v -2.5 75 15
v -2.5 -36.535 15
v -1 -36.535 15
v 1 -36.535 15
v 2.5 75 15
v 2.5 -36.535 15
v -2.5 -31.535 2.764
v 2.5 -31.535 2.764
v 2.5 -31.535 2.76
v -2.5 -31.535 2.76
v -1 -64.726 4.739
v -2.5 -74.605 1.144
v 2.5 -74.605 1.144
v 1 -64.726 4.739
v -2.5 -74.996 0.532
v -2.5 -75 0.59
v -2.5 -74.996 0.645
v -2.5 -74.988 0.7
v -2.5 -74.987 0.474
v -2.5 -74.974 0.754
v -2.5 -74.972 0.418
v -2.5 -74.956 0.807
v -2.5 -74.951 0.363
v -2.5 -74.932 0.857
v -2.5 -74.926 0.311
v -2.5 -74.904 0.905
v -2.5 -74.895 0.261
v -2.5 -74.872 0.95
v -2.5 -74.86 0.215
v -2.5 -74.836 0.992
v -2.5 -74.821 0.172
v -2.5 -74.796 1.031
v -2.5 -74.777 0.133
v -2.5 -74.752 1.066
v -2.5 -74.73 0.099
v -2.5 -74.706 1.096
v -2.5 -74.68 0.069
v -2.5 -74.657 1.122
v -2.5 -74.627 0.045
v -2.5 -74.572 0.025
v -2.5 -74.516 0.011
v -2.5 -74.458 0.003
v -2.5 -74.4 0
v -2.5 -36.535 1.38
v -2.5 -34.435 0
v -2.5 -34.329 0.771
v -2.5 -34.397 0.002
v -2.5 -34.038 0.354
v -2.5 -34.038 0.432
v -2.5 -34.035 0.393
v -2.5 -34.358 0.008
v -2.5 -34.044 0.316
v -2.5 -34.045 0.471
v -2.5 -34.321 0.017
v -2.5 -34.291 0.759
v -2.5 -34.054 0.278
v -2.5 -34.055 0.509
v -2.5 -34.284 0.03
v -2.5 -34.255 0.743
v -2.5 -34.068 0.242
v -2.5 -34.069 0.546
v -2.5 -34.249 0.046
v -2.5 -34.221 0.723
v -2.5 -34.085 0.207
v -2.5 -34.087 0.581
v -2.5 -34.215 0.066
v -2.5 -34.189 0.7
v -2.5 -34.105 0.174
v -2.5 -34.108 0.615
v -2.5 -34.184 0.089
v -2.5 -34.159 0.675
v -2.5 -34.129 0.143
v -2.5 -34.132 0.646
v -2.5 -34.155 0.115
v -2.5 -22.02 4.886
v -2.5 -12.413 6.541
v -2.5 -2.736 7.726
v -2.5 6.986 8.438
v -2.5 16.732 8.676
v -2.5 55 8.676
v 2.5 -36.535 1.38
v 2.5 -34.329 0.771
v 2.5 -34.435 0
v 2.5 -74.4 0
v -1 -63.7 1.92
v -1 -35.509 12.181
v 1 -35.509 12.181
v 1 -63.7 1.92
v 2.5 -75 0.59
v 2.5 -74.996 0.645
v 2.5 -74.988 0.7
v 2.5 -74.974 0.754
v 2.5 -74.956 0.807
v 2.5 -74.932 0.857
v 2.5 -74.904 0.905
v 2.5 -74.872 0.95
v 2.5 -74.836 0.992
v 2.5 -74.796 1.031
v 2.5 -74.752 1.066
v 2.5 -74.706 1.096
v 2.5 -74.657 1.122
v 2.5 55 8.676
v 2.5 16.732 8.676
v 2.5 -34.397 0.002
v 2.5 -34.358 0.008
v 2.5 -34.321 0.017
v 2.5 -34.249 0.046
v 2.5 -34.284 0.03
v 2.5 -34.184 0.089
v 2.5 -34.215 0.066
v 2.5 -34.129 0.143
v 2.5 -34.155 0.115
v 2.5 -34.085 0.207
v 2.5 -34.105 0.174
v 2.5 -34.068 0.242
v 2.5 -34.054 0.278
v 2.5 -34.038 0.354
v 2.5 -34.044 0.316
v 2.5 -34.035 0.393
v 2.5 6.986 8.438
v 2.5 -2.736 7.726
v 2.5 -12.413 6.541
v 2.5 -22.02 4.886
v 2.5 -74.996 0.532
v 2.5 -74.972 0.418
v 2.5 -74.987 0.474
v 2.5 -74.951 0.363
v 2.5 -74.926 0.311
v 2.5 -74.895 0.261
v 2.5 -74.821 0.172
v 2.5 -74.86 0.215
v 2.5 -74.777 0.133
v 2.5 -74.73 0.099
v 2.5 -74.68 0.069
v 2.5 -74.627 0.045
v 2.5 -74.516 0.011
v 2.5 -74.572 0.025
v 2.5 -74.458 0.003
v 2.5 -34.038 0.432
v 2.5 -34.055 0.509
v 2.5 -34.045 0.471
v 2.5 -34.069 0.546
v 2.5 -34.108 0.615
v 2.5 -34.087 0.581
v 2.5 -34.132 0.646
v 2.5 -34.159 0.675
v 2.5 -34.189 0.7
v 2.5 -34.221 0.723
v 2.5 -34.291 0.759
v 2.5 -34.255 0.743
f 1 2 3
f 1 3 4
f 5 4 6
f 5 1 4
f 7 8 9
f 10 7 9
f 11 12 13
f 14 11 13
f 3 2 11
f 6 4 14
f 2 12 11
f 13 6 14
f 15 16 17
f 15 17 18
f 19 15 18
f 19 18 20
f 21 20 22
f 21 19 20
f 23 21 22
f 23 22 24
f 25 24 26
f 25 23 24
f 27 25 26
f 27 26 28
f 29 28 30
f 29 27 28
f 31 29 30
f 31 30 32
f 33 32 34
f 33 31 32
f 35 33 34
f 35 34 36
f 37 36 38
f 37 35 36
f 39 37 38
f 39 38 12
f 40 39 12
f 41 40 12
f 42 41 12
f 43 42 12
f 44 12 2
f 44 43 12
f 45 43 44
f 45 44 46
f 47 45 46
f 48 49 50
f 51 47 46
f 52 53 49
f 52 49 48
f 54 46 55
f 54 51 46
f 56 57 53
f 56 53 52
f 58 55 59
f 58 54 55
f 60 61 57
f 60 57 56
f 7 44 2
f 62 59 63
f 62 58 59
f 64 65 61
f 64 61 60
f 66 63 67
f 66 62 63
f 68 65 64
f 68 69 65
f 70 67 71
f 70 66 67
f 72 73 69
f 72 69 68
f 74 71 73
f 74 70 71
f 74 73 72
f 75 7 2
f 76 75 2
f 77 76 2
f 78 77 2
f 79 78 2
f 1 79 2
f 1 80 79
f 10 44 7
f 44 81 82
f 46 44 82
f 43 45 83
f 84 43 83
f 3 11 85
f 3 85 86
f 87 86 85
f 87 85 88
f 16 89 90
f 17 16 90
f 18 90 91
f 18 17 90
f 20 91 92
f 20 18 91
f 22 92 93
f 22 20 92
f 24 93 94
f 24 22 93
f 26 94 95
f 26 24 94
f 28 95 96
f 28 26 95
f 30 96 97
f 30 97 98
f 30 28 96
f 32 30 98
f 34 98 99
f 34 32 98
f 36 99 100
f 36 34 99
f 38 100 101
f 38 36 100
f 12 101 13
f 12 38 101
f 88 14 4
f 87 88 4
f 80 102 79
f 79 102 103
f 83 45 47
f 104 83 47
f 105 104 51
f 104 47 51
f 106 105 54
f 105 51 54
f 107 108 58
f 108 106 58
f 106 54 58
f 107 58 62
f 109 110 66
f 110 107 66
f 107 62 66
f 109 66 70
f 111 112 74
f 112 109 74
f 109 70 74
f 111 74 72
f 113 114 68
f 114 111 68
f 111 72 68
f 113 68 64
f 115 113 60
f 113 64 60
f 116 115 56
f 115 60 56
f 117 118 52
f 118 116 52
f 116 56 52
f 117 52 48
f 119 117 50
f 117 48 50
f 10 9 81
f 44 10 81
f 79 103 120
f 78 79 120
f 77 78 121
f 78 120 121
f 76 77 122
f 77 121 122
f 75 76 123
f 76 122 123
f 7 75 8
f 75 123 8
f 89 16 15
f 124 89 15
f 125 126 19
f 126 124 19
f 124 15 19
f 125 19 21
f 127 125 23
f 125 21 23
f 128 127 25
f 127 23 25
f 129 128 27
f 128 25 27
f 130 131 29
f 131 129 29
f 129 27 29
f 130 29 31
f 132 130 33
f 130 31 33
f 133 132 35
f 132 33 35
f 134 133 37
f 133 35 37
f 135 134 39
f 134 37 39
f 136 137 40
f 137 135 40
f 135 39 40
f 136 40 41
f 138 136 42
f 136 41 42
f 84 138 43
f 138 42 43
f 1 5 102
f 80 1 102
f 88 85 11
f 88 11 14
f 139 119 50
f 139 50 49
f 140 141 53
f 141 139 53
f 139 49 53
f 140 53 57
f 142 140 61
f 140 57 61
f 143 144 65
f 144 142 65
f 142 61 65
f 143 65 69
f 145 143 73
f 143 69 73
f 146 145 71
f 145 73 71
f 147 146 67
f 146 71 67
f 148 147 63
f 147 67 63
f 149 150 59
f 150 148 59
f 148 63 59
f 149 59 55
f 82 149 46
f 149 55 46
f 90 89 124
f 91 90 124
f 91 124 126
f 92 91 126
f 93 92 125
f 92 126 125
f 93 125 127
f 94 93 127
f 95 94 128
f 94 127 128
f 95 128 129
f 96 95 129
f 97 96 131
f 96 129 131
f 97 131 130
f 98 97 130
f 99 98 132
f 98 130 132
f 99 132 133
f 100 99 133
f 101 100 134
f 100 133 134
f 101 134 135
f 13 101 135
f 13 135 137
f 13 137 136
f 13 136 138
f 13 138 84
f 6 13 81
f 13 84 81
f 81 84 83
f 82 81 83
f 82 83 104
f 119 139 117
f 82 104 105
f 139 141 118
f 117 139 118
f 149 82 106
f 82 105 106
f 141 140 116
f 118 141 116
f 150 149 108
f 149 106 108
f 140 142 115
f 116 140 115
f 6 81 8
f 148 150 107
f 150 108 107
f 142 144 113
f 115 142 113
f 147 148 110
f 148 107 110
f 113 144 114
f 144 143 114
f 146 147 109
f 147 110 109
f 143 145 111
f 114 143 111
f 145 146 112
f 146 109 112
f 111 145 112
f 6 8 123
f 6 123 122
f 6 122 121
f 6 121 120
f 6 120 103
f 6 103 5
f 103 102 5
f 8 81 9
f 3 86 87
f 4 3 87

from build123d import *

# Parameters (mm, degrees)
F0_W        = 5
F0_H        = 150
F1_DEPTH    = 15
F2_SIZE2    = 38.4646838724
F2_SIZE     = 14
F3_T1_DEPTH = 7.1006226146
F3_T3_DEPTH = 8
F5_DEPTH    = 25
F6_T1_DEPTH = 6.5227780604
F6_T3_DEPTH = 7
F7_W        = 2
F7_H        = 30
F8_DEPTH    = 3


# Not quite as in the source:
# - a fillet or chamfer that OpenCascade refuses, or shapes differently, is made with other operations: its cross-section is extruded or revolved along the edge and cut away or added


with BuildPart() as f1:
    # F0 (on Top) → F1 (new body)
    with BuildSketch(Plane.XY):
        Rectangle(F0_W, F0_H)
    extrude(amount=F1_DEPTH)

    # F2
    f2_edges = [f1.edges().sort_by_distance(p)[0] for p in [
        (0, -75, 15),
    ]]
    f2_side = f1.faces().sort_by_distance((0, -75, 7.5))[0]
    chamfer(f2_edges, length=F2_SIZE, length2=F2_SIZE2, reference=f2_side)

    # F3: fillet of radius 0.6 on 2 edges, made by hand

    # F3_s2 → F3_t1 (cut)
    with BuildSketch(Plane.YZ.offset(-3.5503113073)):
        with BuildLine():
            ThreePointArc((-75, 0.5798754771), (-74.8914912266, 0.9240213389), (-74.605212086, 1.1436910495))
            Line((-74.605212086, 1.1436910495), (-75, 1))
            Line((-75, 1), (-75, 0.5798754771))
        make_face()
    extrude(amount=F3_T1_DEPTH, mode=Mode.SUBTRACT)

    # F3_s4 → F3_t3 (cut)
    with BuildSketch(Plane.YZ.offset(-4)):
        with BuildLine():
            ThreePointArc((-75, 0.6), (-74.8242640687, 0.1757359313), (-74.4, 0))
            Line((-74.4, 0), (-75, 0))
            Line((-75, 0), (-75, 0.6))
        make_face()
    extrude(amount=F3_T3_DEPTH, mode=Mode.SUBTRACT)

    # F4 (on face) → F5 (cut)
    with BuildSketch(Plane.YZ.offset(2.5)):
        Polygon((55, 8.6759815816), (75, 8.6759815816), (75, 15), align=None)
        with BuildLine():
            ThreePointArc((16.7323419362, 8.6759815816), (46.1873611716, 6.4950955262), (75, 0))
            Line((75, 0), (75, 8.6759815816))
            Line((75, 8.6759815816), (55, 8.6759815816))
            Line((55, 8.6759815816), (16.7323419362, 8.6759815816))
        make_face()
        with BuildLine():
            Line((-31.5353161276, 0), (75, 0))
            ThreePointArc((75, 0), (46.1873611716, 6.4950955262), (16.7323419362, 8.6759815816))
            ThreePointArc((16.7323419362, 8.6759815816), (-7.5818312879, 7.1925324796), (-31.5353161276, 2.7641913859))
            Line((-31.5353161276, 2.7641913859), (-31.5353161276, 2.76))
            Line((-31.5353161276, 2.76), (-31.5353161276, 0))
        make_face()
        Polygon((-34.0353161276, 0.69), (-31.5353161276, 0), (-31.5353161276, 2.76), (-36.5353161276, 1.38), align=None)
        Polygon((-34.0353161276, 0), (-31.5353161276, 0), (-34.0353161276, 0.69), align=None)
    extrude(amount=-F5_DEPTH, mode=Mode.SUBTRACT)

    # F6: fillet of radius 0.4 on 2 edges, made by hand

    # F6_s2 → F6_t1 (cut)
    with BuildSketch(Plane.YZ.offset(-3.2613890302)):
        with BuildLine():
            ThreePointArc((-34.0353161276, 0.3854443879), (-34.1170643339, 0.6277578125), (-34.3288951064, 0.7710277981))
            Line((-34.3288951064, 0.7710277981), (-34.0353161276, 0.69))
            Line((-34.0353161276, 0.69), (-34.0353161276, 0.3854443879))
        make_face()
    extrude(amount=F6_T1_DEPTH, mode=Mode.SUBTRACT)

    # F6_s4 → F6_t3 (cut)
    with BuildSketch(Plane.YZ.offset(-3.5)):
        with BuildLine():
            ThreePointArc((-34.4353161276, 0), (-34.1524734152, 0.1171572875), (-34.0353161276, 0.4))
            Line((-34.0353161276, 0.4), (-34.0353161276, 0))
            Line((-34.0353161276, 0), (-34.4353161276, 0))
        make_face()
    extrude(amount=F6_T3_DEPTH, mode=Mode.SUBTRACT)

    # F7 (on face) → F8 (cut)
    with BuildSketch(Plane(origin=(0, -9.0947271879, 24.9875575848), x_dir=(1, 0, 0), z_dir=(0, -0.3420201433, 0.9396926208))):
        with Locations((0, -44.2016648133)):
            Rectangle(F7_W, F7_H)
    extrude(amount=-F8_DEPTH, mode=Mode.SUBTRACT)


solid = f1.part
